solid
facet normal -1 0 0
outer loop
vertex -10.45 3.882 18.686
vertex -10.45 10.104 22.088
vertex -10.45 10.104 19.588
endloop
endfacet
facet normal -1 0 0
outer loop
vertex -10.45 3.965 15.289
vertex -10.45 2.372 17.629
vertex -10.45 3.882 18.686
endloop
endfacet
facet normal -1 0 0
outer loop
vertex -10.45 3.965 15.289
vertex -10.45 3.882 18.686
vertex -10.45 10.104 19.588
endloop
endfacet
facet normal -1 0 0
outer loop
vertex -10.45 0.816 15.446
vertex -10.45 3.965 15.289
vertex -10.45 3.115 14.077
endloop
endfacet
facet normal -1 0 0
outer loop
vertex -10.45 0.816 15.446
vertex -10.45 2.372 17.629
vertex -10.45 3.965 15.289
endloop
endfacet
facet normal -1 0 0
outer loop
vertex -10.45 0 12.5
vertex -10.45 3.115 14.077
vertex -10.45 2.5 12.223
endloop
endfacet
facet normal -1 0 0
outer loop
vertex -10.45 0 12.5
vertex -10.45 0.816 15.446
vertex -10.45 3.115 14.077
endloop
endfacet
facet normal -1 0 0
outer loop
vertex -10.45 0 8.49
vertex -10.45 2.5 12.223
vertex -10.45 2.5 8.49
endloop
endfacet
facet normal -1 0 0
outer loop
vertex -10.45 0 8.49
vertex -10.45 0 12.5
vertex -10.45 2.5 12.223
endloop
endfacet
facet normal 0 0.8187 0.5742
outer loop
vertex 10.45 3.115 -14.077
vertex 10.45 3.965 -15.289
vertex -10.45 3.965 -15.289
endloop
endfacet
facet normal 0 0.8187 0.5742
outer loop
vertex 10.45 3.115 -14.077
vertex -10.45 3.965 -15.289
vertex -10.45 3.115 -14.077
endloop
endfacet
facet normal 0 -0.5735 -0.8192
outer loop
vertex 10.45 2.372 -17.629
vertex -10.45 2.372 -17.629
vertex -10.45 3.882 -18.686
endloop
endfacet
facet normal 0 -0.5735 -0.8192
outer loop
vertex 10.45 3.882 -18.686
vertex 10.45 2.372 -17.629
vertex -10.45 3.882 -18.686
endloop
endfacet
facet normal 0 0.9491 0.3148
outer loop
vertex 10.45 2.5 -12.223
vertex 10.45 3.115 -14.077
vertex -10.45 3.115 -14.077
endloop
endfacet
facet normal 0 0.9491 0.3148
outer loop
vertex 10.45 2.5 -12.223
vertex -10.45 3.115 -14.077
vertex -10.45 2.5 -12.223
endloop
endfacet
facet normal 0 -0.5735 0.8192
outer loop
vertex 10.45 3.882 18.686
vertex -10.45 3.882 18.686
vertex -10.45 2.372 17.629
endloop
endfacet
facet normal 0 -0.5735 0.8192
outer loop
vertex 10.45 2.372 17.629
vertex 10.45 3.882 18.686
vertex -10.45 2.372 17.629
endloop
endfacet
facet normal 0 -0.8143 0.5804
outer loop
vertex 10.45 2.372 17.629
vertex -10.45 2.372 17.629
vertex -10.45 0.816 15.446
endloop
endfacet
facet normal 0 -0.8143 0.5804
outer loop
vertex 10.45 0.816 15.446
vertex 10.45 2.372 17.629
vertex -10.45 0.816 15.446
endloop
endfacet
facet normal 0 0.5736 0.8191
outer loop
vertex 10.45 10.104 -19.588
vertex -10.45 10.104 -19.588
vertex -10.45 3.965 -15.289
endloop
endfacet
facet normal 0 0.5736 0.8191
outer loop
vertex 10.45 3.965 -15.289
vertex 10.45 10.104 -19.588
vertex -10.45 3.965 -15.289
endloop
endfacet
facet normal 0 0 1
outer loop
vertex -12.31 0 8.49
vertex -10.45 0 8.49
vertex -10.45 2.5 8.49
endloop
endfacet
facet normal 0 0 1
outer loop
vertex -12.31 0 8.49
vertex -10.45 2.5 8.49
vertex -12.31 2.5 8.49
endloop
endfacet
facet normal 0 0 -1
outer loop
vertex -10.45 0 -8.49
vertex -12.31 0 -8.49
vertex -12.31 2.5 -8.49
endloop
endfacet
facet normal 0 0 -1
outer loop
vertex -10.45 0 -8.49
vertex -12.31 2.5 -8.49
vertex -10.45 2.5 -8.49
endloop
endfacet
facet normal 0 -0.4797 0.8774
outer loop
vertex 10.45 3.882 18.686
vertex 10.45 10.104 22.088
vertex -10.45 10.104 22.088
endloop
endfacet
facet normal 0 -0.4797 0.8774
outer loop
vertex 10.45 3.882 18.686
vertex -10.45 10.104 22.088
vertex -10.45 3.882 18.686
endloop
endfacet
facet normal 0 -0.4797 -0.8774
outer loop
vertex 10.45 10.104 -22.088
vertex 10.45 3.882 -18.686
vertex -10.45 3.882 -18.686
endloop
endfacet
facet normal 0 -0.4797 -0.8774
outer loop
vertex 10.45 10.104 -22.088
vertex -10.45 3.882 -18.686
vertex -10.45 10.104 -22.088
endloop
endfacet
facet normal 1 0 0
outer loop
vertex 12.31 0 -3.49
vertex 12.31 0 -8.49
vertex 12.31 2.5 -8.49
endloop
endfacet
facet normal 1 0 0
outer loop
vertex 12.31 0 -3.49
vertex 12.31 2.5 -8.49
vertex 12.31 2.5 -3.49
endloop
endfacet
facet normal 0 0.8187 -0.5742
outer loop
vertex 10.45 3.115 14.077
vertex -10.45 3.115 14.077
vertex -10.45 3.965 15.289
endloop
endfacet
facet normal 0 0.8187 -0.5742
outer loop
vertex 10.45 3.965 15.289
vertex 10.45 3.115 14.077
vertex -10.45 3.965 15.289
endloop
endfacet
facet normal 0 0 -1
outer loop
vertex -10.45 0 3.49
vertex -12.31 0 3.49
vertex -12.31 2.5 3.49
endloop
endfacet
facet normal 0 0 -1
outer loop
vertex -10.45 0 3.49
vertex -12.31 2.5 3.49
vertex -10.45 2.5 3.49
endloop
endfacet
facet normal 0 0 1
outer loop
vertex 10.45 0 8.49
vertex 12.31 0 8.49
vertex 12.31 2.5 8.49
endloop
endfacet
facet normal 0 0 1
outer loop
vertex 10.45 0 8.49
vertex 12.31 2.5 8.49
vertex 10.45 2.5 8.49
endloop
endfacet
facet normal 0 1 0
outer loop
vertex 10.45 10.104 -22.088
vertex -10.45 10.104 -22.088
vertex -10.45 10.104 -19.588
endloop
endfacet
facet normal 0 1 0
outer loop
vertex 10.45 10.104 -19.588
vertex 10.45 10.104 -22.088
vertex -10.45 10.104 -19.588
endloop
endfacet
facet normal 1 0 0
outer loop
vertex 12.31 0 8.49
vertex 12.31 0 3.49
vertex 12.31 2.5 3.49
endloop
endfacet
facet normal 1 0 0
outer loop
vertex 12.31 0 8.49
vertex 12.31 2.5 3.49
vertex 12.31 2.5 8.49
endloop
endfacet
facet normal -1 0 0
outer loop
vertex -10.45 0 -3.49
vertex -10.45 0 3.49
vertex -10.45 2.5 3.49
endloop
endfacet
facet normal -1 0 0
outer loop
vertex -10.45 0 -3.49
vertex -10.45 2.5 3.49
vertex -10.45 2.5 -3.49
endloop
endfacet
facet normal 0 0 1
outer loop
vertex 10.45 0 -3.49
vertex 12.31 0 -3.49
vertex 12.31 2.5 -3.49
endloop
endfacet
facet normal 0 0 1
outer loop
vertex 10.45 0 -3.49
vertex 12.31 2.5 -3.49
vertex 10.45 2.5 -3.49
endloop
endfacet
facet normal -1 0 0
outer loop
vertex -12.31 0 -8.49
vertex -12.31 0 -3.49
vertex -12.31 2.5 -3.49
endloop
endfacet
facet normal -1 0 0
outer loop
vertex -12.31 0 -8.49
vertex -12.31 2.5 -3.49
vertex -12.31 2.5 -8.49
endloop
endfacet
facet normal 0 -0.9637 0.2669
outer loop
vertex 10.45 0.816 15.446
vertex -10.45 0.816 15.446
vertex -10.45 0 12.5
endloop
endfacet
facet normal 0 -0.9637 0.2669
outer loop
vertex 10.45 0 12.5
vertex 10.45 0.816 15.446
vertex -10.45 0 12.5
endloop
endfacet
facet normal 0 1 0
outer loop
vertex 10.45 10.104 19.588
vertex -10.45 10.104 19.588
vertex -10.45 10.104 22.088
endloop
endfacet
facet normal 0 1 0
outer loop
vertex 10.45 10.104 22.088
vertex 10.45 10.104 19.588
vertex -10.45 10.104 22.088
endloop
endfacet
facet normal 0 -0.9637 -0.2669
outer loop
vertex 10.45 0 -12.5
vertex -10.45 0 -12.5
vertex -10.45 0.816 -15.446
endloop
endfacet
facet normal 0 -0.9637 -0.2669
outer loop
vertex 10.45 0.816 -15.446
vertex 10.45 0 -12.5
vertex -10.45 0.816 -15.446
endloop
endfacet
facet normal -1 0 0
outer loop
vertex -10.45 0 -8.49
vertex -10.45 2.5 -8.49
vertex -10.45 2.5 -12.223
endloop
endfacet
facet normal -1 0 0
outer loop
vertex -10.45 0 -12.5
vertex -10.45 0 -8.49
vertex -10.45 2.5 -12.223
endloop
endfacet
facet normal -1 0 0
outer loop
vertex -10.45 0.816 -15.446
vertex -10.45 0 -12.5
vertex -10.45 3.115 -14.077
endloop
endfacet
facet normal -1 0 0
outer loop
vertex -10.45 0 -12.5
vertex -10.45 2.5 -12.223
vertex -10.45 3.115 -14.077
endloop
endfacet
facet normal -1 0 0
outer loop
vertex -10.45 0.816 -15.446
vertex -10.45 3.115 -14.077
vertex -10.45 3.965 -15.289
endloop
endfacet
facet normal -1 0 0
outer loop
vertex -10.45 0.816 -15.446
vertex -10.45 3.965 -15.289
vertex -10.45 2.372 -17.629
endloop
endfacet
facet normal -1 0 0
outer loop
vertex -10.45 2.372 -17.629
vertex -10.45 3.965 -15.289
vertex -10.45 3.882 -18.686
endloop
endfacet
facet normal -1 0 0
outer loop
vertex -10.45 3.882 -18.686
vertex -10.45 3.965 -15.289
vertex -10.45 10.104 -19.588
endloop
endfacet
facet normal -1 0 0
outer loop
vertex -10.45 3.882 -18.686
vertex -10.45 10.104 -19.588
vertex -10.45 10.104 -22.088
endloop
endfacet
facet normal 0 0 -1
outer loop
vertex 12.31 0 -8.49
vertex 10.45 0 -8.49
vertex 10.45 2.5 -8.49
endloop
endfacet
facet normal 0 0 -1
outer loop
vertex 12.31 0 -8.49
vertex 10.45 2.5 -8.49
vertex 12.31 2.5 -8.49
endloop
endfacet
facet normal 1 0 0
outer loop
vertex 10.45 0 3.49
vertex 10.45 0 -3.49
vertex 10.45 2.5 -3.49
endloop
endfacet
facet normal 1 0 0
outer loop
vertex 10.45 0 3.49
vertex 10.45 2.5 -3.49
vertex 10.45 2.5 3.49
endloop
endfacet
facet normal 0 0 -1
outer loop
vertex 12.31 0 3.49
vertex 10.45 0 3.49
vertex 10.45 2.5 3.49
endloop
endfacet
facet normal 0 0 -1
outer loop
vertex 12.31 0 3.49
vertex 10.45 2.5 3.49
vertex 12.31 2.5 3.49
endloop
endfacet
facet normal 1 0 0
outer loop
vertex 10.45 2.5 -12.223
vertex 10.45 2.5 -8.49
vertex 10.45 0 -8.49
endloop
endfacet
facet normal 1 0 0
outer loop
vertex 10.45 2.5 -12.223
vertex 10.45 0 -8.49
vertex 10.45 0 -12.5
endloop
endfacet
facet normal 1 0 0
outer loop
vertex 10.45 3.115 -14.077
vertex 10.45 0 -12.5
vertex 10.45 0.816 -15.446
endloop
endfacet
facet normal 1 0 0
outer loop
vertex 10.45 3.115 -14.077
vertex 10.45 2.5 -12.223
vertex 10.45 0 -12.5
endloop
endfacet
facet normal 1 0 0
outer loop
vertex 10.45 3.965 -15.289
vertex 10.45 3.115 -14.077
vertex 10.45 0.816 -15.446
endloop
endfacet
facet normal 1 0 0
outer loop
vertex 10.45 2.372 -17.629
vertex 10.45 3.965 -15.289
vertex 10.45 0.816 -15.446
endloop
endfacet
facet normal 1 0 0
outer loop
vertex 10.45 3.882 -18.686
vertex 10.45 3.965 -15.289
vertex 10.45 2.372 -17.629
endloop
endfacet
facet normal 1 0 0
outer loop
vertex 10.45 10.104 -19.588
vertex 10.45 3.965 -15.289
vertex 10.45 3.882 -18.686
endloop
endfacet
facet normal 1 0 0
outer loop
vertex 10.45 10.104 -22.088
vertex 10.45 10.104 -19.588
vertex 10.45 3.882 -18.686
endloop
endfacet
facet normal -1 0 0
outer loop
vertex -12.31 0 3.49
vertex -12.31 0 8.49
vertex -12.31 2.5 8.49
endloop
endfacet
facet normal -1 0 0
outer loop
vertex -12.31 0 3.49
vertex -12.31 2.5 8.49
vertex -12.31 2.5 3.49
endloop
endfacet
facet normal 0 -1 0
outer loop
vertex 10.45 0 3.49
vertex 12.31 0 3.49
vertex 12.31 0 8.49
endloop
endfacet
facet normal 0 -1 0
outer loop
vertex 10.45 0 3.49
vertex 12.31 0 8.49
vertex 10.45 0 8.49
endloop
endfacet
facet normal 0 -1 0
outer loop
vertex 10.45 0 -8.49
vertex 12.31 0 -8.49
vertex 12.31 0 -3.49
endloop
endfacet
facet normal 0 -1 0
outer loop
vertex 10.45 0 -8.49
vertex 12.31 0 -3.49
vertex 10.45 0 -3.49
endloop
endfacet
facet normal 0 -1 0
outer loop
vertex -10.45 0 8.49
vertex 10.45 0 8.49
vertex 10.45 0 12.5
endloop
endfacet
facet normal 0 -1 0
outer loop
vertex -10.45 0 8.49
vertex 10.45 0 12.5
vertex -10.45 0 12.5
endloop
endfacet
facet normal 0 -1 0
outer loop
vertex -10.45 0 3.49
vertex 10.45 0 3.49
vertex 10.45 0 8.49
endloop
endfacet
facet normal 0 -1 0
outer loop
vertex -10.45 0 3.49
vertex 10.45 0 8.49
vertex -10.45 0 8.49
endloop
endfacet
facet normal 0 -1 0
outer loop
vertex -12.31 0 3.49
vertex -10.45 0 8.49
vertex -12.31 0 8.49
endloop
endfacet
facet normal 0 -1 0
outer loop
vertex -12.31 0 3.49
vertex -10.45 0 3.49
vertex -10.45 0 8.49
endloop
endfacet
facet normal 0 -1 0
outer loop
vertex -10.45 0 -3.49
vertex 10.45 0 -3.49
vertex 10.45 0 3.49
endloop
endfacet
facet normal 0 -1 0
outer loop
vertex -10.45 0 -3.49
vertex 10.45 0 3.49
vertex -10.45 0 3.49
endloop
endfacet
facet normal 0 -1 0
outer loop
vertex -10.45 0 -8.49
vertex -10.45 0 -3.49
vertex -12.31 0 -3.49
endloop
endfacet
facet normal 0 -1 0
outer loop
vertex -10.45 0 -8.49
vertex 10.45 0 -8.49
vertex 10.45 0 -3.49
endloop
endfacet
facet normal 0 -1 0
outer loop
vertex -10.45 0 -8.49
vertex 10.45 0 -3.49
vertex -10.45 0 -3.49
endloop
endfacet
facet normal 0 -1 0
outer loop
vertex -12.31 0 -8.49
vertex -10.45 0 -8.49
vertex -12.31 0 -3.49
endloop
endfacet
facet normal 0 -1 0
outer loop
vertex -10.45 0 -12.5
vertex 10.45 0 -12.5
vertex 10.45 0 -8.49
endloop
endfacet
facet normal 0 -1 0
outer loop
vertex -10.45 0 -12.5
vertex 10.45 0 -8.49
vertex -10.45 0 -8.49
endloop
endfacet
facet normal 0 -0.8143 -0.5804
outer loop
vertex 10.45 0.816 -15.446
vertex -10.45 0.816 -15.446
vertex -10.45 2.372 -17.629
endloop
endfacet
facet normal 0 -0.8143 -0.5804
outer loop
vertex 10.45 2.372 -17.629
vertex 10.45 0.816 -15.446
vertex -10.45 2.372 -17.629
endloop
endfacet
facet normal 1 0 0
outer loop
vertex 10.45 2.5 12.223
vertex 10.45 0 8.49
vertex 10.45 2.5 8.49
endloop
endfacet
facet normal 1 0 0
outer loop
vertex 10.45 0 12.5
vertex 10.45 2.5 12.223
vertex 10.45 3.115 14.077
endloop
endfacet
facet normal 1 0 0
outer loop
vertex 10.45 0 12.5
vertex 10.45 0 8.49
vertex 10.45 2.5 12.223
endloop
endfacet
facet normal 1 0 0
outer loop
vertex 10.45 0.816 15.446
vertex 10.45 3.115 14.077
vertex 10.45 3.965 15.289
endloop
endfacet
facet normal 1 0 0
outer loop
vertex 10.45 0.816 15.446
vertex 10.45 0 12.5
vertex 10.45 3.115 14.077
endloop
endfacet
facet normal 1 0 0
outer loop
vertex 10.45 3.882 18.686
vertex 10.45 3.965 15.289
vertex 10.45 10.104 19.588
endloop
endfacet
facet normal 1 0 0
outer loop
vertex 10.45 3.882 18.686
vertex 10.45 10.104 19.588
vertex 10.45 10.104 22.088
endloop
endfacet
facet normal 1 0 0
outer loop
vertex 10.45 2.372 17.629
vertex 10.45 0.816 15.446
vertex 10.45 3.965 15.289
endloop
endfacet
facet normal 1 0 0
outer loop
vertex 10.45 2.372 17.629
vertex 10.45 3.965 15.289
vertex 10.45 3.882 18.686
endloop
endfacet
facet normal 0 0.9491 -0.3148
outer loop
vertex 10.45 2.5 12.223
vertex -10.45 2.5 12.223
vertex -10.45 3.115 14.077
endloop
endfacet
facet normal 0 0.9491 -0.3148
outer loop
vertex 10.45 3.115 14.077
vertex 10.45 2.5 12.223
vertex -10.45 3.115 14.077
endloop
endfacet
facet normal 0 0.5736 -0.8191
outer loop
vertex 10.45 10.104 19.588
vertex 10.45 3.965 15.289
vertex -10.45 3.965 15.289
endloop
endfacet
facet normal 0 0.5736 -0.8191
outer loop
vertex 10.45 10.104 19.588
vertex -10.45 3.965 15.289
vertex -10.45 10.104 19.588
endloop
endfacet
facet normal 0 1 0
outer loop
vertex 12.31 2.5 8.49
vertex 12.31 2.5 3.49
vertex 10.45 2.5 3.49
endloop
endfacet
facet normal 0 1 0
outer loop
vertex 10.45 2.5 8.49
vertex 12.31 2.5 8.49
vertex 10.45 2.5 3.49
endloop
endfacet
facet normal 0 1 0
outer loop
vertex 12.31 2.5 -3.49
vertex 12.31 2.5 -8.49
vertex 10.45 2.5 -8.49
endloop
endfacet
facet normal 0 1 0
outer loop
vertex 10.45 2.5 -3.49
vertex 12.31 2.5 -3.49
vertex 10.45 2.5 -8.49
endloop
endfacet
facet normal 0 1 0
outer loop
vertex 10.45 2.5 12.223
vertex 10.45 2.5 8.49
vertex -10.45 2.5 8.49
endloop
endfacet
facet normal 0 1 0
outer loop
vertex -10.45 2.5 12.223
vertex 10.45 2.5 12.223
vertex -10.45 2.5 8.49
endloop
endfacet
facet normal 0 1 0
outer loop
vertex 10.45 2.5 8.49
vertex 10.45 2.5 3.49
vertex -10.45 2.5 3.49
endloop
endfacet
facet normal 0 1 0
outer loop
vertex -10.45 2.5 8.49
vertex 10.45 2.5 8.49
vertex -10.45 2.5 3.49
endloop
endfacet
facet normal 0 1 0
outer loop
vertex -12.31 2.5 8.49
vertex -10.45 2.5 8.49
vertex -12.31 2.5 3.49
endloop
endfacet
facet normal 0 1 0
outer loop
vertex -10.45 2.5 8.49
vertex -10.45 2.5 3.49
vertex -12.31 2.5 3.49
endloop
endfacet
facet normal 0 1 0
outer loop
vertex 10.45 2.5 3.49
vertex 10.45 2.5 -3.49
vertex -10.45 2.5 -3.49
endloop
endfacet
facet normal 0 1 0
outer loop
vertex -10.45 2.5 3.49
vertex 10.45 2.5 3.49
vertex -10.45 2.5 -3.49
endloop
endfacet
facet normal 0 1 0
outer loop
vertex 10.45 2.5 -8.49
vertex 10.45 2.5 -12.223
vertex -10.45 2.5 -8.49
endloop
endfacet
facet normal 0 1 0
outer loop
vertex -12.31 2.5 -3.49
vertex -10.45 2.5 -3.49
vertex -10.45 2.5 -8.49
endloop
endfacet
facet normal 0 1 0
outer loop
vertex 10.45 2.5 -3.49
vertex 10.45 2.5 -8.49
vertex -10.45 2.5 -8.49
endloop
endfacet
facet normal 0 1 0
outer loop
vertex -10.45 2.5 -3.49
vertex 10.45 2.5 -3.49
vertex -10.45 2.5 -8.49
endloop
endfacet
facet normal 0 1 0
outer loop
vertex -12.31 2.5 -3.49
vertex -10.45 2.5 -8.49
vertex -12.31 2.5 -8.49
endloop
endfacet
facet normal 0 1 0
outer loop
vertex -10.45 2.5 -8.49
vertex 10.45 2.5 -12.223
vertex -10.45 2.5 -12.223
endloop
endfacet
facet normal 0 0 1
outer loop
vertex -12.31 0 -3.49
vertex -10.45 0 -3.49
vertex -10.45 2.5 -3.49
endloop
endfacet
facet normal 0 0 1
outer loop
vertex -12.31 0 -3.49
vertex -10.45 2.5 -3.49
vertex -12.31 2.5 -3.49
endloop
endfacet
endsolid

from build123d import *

# Parameters (mm, degrees)
EXTRUDE_1_DEPTH      = 2.5
EXTRUDE_2_DEPTH      = 10.45
EXTRUDE_2_DEPTH_BACK = 10.45


with BuildPart() as part:
    # 스케치2 → 보스-돌출1 (new body)
    with BuildSketch(Plane(origin=(0, 0, 0), x_dir=(1, 0, 0), z_dir=(0, 1, 0))):
        Polygon((-10.45, 12.5), (10.45, 12.5), (10.45, 8.49), (12.309935206, 8.49), (12.309935206, 3.49), (10.45, 3.49), (10.45, -3.49), (12.309935206, -3.49), (12.309935206, -8.49), (10.45, -8.49), (10.45, -12.5), (-10.45, -12.5), (-10.45, -8.49), (-12.309935206, -8.49), (-12.309935206, -3.49), (-10.45, -3.49), (-10.45, 3.49), (-12.309935206, 3.49), (-12.309935206, 8.49), (-10.45, 8.49), align=None)
    extrude(amount=EXTRUDE_1_DEPTH)

    # 스케치3 → 보스-돌출2 (add, two sides: drawn at the far end of the back side and taken through both)
    with BuildSketch(Plane(origin=(0, 0, 0), x_dir=(0, 0, -1), z_dir=(1, 0, 0)).offset(-EXTRUDE_2_DEPTH_BACK)):
        Polygon((0, 0), (12.5, 0), (15.446494384, 0.816274423), (17.628816823, 2.372016775), (18.685999924, 3.881830714), (22.088144039, 10.103695427), (19.588144039, 10.103695427), (15.289438896, 3.964508245), (14.076540474, 3.115227628), (12.22303717, 2.5), (-12.347890055, 2.5), (-12.22303717, 2.5), (-14.076540474, 3.115227628), (-15.289438896, 3.964508245), (-19.588144039, 10.103695427), (-22.088144039, 10.103695427), (-18.685999924, 3.881830714), (-17.628816823, 2.372016775), (-15.446494384, 0.816274423), (-12.5, 0), align=None)
    extrude(amount=EXTRUDE_2_DEPTH + EXTRUDE_2_DEPTH_BACK)


solid = part.part
